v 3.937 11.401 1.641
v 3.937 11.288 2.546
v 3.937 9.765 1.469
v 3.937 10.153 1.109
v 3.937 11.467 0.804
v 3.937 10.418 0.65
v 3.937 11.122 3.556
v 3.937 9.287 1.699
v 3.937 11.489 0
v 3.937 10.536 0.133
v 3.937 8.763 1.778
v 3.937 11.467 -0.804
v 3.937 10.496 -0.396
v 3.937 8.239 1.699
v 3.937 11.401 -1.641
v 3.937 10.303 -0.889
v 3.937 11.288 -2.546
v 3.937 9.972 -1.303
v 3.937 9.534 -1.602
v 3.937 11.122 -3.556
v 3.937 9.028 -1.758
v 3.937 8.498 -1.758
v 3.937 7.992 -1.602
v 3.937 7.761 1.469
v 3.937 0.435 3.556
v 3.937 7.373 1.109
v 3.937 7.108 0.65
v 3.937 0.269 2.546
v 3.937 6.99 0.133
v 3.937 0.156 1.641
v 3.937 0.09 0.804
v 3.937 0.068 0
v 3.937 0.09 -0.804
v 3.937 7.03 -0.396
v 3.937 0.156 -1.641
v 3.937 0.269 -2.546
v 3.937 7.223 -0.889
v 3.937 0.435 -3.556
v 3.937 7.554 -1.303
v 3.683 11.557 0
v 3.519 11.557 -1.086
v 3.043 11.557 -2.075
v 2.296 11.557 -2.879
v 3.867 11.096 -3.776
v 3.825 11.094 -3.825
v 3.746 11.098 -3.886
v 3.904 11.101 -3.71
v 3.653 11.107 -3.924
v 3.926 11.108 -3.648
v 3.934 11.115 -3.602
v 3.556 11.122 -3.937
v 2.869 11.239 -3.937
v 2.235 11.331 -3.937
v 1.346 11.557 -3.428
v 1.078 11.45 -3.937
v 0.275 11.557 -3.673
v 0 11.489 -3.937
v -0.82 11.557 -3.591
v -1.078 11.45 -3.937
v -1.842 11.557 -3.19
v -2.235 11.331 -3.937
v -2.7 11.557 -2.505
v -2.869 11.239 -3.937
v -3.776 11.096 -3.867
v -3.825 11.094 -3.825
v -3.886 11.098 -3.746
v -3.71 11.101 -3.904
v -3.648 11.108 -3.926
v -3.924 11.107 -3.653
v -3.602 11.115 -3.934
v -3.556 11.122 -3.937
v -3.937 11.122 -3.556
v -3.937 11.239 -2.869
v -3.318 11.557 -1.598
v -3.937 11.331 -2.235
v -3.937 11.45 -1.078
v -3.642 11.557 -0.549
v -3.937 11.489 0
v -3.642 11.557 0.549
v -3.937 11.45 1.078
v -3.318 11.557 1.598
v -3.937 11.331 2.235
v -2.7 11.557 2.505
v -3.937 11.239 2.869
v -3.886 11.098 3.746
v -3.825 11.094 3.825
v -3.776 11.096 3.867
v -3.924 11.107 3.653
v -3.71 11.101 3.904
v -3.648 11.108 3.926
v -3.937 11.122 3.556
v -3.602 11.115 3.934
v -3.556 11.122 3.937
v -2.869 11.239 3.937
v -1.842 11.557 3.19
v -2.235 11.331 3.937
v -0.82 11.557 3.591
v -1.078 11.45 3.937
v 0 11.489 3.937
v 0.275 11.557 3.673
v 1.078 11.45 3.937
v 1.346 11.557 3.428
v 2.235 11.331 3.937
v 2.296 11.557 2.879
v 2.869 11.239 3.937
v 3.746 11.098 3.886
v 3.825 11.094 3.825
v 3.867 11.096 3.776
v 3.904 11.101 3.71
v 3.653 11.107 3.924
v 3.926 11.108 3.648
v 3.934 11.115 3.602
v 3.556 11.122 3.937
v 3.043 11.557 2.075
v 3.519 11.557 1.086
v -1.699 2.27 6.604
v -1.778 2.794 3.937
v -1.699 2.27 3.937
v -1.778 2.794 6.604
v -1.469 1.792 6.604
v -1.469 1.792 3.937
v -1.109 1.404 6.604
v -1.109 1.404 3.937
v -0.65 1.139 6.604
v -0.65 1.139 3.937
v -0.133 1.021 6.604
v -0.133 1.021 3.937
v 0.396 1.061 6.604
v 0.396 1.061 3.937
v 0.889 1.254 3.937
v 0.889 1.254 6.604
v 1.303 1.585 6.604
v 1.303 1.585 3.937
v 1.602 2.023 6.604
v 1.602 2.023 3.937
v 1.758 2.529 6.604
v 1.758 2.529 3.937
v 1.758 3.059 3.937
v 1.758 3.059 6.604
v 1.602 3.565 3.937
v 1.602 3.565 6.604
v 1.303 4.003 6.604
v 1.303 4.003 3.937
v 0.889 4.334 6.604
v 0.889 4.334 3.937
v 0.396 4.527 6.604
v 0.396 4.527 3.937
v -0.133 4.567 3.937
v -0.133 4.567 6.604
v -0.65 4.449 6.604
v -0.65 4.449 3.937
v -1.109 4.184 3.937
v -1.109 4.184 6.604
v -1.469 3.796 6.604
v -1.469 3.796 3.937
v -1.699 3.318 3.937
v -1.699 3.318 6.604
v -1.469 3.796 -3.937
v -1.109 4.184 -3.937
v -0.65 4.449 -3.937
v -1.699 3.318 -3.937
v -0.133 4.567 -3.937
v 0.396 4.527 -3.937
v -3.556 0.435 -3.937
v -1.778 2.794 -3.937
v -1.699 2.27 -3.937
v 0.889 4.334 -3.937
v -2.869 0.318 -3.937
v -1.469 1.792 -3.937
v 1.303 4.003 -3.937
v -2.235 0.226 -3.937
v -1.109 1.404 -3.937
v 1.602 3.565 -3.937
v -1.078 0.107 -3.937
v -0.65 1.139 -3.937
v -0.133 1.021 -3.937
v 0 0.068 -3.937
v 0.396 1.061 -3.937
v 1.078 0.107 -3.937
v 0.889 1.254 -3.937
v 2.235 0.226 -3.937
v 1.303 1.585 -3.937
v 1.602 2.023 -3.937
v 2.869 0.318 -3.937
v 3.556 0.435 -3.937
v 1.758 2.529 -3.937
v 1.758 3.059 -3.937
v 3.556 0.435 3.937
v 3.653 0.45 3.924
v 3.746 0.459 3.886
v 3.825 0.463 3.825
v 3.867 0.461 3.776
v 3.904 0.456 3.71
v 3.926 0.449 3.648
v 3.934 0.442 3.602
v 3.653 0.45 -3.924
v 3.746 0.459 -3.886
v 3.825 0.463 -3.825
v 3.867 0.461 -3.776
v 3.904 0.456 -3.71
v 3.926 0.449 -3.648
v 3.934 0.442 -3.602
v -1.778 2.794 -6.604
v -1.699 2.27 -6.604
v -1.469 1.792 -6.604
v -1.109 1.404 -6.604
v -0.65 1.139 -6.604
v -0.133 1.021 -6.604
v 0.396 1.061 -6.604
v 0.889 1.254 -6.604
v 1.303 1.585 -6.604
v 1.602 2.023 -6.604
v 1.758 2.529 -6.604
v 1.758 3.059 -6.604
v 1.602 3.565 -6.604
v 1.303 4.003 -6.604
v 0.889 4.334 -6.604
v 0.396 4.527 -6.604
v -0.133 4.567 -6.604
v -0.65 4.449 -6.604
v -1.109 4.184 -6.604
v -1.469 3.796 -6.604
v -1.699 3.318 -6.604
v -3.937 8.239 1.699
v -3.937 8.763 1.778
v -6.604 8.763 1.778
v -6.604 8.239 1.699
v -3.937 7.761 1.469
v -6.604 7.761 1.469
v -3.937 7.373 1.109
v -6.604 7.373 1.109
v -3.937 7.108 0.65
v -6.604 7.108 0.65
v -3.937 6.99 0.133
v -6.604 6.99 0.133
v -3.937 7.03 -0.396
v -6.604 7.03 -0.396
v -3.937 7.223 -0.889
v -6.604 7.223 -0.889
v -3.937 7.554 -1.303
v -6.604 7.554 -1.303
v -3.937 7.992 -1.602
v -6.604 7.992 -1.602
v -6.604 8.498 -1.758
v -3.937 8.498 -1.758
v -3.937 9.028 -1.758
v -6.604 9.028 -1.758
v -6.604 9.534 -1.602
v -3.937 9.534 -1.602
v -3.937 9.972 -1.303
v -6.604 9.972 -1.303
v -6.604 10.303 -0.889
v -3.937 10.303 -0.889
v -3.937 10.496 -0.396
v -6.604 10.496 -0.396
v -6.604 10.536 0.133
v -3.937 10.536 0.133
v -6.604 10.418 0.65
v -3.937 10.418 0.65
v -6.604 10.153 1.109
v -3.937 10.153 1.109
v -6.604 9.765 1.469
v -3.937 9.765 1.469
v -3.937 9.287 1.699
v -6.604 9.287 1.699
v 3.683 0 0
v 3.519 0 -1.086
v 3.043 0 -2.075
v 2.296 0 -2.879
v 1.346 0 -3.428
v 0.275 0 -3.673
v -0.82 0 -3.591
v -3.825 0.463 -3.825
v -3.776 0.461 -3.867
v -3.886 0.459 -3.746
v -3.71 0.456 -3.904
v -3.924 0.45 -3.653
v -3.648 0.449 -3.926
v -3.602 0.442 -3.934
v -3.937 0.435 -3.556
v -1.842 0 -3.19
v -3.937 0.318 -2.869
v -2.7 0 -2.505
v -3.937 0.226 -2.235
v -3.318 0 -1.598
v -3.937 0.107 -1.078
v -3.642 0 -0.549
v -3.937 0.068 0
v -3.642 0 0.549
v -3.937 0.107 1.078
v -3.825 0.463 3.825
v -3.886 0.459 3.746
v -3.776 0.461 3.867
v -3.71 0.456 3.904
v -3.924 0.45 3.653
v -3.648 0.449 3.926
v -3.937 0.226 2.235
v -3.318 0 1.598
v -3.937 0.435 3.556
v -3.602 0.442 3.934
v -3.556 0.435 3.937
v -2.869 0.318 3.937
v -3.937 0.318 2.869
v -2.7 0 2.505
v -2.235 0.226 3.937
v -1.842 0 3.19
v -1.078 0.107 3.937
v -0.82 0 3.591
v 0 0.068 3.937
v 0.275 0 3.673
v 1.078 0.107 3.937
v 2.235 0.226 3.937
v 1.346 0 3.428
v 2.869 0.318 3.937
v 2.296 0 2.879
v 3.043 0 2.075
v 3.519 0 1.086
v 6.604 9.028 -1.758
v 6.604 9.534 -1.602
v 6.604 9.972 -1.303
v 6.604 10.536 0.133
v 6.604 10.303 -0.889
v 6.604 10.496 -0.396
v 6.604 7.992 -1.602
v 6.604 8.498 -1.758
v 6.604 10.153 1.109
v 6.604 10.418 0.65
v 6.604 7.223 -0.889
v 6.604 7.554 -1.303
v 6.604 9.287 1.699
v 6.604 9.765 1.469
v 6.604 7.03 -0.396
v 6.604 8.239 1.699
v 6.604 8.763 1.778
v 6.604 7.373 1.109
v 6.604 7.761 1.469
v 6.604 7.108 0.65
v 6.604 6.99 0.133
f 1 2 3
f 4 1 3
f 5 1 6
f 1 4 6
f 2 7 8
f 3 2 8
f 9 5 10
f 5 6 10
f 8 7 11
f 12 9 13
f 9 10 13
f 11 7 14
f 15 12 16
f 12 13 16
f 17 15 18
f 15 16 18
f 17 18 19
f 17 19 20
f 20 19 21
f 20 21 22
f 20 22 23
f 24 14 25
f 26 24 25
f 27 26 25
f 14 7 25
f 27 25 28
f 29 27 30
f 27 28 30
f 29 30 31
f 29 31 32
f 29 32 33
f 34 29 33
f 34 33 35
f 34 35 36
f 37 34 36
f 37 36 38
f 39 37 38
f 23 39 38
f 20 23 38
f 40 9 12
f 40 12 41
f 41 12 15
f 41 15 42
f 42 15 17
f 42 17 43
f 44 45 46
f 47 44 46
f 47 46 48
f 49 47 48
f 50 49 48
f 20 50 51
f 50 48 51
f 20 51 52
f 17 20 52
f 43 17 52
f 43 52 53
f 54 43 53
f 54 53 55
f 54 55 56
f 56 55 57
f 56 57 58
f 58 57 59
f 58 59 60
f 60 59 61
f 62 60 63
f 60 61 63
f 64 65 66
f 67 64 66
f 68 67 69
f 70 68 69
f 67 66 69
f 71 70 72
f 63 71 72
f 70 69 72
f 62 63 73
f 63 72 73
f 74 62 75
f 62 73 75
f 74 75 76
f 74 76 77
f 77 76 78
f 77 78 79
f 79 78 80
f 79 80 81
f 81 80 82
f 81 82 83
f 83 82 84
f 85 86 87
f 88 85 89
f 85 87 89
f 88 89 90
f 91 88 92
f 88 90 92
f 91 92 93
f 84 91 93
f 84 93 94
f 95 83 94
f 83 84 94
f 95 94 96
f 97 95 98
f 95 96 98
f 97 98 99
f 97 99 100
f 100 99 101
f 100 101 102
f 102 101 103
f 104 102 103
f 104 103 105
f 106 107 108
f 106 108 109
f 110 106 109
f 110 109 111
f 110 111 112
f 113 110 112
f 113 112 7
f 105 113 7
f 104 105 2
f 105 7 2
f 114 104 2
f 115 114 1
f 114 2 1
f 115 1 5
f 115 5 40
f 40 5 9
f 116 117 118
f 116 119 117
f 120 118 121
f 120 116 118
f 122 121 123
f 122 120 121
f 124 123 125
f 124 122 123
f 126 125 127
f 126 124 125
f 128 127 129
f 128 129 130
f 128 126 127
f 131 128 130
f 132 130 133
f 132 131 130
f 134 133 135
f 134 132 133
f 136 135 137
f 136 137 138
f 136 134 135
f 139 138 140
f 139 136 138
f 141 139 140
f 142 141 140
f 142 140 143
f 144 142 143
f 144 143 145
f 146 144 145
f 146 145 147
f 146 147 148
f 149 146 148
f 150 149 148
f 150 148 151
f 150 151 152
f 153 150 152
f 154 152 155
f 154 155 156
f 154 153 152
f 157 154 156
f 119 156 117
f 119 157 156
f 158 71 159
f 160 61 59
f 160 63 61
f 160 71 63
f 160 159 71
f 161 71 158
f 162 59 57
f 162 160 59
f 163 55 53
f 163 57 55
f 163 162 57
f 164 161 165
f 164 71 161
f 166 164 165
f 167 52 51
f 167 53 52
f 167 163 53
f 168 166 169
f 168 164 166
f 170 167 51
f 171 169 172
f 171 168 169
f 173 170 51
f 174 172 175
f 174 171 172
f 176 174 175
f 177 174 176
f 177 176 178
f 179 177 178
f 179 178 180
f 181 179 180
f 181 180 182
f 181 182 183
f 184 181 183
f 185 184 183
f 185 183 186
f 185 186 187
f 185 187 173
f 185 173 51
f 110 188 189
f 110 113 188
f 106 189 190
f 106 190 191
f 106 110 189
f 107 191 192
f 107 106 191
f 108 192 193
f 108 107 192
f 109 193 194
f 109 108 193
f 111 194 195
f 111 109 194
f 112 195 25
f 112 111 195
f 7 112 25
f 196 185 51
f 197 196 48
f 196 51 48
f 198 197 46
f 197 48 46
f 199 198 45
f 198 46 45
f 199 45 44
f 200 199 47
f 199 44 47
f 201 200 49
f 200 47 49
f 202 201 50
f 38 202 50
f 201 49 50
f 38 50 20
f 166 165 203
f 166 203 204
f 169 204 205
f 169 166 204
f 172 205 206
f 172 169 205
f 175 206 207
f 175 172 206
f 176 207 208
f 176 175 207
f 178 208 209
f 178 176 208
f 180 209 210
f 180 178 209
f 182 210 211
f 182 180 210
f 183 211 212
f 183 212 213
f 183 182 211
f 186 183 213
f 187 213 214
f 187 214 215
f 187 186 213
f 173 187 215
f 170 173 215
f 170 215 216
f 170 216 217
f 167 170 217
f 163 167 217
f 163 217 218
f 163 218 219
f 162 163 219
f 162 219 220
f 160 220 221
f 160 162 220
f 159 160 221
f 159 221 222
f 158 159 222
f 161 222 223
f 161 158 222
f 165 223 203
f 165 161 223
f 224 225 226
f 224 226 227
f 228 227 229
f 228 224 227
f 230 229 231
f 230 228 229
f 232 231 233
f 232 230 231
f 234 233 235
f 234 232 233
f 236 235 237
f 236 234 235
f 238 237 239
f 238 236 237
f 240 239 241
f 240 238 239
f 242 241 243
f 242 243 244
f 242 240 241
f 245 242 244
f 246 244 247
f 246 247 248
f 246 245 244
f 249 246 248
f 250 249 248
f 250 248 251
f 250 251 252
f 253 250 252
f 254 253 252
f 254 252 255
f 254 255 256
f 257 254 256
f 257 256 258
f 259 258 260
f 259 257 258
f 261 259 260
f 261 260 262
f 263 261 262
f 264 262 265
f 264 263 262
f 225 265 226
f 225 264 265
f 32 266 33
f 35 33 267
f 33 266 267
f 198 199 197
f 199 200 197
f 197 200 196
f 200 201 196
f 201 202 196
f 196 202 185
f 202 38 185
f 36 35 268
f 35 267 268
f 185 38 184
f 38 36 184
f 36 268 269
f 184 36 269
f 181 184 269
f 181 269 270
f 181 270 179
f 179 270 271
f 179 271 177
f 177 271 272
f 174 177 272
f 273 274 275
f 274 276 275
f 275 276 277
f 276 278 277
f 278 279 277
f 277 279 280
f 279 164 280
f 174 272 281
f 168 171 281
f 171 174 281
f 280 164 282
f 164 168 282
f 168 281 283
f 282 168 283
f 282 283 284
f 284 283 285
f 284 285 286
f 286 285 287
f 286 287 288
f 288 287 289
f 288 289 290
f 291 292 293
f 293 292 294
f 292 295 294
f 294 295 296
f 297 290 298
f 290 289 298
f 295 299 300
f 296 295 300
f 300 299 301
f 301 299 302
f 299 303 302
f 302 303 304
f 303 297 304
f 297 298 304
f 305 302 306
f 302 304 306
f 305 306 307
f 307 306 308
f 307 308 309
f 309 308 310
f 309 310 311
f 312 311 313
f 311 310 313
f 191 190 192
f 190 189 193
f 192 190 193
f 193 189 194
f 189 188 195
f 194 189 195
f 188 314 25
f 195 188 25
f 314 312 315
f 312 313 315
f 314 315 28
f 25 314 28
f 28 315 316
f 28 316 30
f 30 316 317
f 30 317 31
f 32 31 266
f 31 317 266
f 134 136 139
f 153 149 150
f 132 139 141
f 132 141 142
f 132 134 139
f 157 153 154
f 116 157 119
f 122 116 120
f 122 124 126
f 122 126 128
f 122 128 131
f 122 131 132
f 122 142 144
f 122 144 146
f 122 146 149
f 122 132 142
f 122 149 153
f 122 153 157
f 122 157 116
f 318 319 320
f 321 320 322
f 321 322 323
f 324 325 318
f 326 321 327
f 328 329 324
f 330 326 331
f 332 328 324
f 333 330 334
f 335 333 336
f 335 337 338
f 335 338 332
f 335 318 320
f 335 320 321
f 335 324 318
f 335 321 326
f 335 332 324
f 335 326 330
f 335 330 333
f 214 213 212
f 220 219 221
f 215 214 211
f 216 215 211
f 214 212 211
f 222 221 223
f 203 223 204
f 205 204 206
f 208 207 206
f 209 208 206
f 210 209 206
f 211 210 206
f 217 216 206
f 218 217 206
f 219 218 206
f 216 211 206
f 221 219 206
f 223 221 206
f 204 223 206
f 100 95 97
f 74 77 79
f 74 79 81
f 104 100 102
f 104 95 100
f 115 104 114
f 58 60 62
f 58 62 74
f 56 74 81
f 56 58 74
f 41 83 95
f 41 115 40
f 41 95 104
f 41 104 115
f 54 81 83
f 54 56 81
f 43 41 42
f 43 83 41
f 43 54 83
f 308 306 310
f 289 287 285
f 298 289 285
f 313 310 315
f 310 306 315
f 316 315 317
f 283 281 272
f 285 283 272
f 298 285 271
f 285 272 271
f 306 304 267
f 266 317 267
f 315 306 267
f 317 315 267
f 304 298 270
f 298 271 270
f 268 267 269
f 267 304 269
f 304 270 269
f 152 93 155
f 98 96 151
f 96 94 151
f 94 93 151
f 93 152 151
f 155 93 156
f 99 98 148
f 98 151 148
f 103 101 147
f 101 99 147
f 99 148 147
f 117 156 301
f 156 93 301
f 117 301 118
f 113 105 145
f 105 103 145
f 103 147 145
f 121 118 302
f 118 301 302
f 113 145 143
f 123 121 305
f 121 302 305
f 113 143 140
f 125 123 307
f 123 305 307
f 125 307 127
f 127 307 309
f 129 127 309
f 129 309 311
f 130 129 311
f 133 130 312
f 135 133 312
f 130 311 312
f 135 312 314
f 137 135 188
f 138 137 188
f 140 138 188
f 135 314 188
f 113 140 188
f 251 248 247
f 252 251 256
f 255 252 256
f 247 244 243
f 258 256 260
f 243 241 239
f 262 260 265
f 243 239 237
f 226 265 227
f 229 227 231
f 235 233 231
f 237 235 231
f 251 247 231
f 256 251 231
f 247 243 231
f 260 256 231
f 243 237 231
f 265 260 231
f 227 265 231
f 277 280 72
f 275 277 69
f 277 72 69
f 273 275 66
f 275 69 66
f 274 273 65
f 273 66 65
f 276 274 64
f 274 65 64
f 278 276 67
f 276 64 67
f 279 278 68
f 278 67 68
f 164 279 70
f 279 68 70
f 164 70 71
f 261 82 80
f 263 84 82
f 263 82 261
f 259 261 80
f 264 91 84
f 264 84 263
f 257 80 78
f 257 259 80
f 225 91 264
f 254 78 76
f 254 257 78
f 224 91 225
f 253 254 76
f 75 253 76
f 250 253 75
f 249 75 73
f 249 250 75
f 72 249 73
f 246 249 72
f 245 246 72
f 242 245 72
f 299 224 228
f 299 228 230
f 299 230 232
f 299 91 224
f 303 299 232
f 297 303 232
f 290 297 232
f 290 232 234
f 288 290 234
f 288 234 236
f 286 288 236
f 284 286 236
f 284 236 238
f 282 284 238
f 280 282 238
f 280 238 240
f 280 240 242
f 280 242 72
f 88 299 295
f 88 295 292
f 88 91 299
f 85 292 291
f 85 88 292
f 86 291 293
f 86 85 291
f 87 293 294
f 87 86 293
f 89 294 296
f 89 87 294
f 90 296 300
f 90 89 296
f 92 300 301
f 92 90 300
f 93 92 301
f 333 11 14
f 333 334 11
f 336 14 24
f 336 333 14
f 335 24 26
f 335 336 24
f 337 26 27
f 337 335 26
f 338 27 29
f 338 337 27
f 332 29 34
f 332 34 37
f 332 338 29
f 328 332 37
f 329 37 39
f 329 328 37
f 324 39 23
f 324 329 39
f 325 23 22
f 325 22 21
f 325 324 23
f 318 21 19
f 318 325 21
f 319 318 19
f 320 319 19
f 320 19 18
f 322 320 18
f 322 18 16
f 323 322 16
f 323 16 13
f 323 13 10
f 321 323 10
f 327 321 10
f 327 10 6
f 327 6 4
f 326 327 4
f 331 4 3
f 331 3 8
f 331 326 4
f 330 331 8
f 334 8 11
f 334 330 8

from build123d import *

# Parameters (mm, degrees)
INTERMEDIATE_BODY_SK_W  = 7.874
INTERMEDIATE_BODY_SK_H  = 7.874
INTERMEDIATE_BODY_DEPTH = 11.557
PIN1_R                  = 1.778
PIN_EXTRUDE1_DEPTH      = 6.604
PIN2_R                  = 1.778
PIN_EXTRUDE2_DEPTH      = 6.604
FILLET1_R               = 0.381


with BuildPart() as part:
    # Intermediate_Body-Sk → Intermediate_Body (new body)
    with BuildSketch(Plane(origin=(0, 0, 0), x_dir=(1, 0, 0), z_dir=(0, 1, 0))):
        Rectangle(INTERMEDIATE_BODY_SK_W, INTERMEDIATE_BODY_SK_H)
    extrude(amount=INTERMEDIATE_BODY_DEPTH)

    # Rev-CutSk → Cut-Revolve2 (revolve, cut)
    with BuildSketch(Plane.XY, mode=Mode.PRIVATE) as cut_revolve2_sk:
        Polygon((-3.683, 11.557), (-10.033, 9.855522628), (-10.033, 1.701477372), (-3.683, 0), (-12.573, 0), (-12.573, 11.557), align=None)
    revolve(cut_revolve2_sk.sketch.rotate(Axis((0, 0, 0), (0, 1, 0)), 180), axis=Axis((0, 0, 0), (0, 1, 0)), mode=Mode.SUBTRACT)

    # Pin1 → Pin-Extrude1 (add, symmetric)
    with BuildSketch(Plane.XY):
        with Locations(Location((0, 2.794, 0), (0, 0, 180))):
            Circle(PIN1_R)
    extrude(amount=PIN_EXTRUDE1_DEPTH, both=True)

    # Pin2 → Pin-Extrude2 (add, symmetric)
    with BuildSketch(Plane(origin=(0, 0, 0), x_dir=(0, 0, -1), z_dir=(1, 0, 0))):
        with Locations(Location((0, 8.763, 0), (0, 0, 180))):
            Circle(PIN2_R)
    extrude(amount=PIN_EXTRUDE2_DEPTH, both=True)

    # Fillet1
    fillet1_edges = [part.edges().sort_by_distance(p)[0] for p in [
        (3.937, 5.7785, -3.937),
        (-3.937, 5.7785, -3.937),
        (-3.937, 5.7785, 3.937),
        (3.937, 5.7785, 3.937),
    ]]
    fillet(fillet1_edges, radius=FILLET1_R)


solid = part.part
